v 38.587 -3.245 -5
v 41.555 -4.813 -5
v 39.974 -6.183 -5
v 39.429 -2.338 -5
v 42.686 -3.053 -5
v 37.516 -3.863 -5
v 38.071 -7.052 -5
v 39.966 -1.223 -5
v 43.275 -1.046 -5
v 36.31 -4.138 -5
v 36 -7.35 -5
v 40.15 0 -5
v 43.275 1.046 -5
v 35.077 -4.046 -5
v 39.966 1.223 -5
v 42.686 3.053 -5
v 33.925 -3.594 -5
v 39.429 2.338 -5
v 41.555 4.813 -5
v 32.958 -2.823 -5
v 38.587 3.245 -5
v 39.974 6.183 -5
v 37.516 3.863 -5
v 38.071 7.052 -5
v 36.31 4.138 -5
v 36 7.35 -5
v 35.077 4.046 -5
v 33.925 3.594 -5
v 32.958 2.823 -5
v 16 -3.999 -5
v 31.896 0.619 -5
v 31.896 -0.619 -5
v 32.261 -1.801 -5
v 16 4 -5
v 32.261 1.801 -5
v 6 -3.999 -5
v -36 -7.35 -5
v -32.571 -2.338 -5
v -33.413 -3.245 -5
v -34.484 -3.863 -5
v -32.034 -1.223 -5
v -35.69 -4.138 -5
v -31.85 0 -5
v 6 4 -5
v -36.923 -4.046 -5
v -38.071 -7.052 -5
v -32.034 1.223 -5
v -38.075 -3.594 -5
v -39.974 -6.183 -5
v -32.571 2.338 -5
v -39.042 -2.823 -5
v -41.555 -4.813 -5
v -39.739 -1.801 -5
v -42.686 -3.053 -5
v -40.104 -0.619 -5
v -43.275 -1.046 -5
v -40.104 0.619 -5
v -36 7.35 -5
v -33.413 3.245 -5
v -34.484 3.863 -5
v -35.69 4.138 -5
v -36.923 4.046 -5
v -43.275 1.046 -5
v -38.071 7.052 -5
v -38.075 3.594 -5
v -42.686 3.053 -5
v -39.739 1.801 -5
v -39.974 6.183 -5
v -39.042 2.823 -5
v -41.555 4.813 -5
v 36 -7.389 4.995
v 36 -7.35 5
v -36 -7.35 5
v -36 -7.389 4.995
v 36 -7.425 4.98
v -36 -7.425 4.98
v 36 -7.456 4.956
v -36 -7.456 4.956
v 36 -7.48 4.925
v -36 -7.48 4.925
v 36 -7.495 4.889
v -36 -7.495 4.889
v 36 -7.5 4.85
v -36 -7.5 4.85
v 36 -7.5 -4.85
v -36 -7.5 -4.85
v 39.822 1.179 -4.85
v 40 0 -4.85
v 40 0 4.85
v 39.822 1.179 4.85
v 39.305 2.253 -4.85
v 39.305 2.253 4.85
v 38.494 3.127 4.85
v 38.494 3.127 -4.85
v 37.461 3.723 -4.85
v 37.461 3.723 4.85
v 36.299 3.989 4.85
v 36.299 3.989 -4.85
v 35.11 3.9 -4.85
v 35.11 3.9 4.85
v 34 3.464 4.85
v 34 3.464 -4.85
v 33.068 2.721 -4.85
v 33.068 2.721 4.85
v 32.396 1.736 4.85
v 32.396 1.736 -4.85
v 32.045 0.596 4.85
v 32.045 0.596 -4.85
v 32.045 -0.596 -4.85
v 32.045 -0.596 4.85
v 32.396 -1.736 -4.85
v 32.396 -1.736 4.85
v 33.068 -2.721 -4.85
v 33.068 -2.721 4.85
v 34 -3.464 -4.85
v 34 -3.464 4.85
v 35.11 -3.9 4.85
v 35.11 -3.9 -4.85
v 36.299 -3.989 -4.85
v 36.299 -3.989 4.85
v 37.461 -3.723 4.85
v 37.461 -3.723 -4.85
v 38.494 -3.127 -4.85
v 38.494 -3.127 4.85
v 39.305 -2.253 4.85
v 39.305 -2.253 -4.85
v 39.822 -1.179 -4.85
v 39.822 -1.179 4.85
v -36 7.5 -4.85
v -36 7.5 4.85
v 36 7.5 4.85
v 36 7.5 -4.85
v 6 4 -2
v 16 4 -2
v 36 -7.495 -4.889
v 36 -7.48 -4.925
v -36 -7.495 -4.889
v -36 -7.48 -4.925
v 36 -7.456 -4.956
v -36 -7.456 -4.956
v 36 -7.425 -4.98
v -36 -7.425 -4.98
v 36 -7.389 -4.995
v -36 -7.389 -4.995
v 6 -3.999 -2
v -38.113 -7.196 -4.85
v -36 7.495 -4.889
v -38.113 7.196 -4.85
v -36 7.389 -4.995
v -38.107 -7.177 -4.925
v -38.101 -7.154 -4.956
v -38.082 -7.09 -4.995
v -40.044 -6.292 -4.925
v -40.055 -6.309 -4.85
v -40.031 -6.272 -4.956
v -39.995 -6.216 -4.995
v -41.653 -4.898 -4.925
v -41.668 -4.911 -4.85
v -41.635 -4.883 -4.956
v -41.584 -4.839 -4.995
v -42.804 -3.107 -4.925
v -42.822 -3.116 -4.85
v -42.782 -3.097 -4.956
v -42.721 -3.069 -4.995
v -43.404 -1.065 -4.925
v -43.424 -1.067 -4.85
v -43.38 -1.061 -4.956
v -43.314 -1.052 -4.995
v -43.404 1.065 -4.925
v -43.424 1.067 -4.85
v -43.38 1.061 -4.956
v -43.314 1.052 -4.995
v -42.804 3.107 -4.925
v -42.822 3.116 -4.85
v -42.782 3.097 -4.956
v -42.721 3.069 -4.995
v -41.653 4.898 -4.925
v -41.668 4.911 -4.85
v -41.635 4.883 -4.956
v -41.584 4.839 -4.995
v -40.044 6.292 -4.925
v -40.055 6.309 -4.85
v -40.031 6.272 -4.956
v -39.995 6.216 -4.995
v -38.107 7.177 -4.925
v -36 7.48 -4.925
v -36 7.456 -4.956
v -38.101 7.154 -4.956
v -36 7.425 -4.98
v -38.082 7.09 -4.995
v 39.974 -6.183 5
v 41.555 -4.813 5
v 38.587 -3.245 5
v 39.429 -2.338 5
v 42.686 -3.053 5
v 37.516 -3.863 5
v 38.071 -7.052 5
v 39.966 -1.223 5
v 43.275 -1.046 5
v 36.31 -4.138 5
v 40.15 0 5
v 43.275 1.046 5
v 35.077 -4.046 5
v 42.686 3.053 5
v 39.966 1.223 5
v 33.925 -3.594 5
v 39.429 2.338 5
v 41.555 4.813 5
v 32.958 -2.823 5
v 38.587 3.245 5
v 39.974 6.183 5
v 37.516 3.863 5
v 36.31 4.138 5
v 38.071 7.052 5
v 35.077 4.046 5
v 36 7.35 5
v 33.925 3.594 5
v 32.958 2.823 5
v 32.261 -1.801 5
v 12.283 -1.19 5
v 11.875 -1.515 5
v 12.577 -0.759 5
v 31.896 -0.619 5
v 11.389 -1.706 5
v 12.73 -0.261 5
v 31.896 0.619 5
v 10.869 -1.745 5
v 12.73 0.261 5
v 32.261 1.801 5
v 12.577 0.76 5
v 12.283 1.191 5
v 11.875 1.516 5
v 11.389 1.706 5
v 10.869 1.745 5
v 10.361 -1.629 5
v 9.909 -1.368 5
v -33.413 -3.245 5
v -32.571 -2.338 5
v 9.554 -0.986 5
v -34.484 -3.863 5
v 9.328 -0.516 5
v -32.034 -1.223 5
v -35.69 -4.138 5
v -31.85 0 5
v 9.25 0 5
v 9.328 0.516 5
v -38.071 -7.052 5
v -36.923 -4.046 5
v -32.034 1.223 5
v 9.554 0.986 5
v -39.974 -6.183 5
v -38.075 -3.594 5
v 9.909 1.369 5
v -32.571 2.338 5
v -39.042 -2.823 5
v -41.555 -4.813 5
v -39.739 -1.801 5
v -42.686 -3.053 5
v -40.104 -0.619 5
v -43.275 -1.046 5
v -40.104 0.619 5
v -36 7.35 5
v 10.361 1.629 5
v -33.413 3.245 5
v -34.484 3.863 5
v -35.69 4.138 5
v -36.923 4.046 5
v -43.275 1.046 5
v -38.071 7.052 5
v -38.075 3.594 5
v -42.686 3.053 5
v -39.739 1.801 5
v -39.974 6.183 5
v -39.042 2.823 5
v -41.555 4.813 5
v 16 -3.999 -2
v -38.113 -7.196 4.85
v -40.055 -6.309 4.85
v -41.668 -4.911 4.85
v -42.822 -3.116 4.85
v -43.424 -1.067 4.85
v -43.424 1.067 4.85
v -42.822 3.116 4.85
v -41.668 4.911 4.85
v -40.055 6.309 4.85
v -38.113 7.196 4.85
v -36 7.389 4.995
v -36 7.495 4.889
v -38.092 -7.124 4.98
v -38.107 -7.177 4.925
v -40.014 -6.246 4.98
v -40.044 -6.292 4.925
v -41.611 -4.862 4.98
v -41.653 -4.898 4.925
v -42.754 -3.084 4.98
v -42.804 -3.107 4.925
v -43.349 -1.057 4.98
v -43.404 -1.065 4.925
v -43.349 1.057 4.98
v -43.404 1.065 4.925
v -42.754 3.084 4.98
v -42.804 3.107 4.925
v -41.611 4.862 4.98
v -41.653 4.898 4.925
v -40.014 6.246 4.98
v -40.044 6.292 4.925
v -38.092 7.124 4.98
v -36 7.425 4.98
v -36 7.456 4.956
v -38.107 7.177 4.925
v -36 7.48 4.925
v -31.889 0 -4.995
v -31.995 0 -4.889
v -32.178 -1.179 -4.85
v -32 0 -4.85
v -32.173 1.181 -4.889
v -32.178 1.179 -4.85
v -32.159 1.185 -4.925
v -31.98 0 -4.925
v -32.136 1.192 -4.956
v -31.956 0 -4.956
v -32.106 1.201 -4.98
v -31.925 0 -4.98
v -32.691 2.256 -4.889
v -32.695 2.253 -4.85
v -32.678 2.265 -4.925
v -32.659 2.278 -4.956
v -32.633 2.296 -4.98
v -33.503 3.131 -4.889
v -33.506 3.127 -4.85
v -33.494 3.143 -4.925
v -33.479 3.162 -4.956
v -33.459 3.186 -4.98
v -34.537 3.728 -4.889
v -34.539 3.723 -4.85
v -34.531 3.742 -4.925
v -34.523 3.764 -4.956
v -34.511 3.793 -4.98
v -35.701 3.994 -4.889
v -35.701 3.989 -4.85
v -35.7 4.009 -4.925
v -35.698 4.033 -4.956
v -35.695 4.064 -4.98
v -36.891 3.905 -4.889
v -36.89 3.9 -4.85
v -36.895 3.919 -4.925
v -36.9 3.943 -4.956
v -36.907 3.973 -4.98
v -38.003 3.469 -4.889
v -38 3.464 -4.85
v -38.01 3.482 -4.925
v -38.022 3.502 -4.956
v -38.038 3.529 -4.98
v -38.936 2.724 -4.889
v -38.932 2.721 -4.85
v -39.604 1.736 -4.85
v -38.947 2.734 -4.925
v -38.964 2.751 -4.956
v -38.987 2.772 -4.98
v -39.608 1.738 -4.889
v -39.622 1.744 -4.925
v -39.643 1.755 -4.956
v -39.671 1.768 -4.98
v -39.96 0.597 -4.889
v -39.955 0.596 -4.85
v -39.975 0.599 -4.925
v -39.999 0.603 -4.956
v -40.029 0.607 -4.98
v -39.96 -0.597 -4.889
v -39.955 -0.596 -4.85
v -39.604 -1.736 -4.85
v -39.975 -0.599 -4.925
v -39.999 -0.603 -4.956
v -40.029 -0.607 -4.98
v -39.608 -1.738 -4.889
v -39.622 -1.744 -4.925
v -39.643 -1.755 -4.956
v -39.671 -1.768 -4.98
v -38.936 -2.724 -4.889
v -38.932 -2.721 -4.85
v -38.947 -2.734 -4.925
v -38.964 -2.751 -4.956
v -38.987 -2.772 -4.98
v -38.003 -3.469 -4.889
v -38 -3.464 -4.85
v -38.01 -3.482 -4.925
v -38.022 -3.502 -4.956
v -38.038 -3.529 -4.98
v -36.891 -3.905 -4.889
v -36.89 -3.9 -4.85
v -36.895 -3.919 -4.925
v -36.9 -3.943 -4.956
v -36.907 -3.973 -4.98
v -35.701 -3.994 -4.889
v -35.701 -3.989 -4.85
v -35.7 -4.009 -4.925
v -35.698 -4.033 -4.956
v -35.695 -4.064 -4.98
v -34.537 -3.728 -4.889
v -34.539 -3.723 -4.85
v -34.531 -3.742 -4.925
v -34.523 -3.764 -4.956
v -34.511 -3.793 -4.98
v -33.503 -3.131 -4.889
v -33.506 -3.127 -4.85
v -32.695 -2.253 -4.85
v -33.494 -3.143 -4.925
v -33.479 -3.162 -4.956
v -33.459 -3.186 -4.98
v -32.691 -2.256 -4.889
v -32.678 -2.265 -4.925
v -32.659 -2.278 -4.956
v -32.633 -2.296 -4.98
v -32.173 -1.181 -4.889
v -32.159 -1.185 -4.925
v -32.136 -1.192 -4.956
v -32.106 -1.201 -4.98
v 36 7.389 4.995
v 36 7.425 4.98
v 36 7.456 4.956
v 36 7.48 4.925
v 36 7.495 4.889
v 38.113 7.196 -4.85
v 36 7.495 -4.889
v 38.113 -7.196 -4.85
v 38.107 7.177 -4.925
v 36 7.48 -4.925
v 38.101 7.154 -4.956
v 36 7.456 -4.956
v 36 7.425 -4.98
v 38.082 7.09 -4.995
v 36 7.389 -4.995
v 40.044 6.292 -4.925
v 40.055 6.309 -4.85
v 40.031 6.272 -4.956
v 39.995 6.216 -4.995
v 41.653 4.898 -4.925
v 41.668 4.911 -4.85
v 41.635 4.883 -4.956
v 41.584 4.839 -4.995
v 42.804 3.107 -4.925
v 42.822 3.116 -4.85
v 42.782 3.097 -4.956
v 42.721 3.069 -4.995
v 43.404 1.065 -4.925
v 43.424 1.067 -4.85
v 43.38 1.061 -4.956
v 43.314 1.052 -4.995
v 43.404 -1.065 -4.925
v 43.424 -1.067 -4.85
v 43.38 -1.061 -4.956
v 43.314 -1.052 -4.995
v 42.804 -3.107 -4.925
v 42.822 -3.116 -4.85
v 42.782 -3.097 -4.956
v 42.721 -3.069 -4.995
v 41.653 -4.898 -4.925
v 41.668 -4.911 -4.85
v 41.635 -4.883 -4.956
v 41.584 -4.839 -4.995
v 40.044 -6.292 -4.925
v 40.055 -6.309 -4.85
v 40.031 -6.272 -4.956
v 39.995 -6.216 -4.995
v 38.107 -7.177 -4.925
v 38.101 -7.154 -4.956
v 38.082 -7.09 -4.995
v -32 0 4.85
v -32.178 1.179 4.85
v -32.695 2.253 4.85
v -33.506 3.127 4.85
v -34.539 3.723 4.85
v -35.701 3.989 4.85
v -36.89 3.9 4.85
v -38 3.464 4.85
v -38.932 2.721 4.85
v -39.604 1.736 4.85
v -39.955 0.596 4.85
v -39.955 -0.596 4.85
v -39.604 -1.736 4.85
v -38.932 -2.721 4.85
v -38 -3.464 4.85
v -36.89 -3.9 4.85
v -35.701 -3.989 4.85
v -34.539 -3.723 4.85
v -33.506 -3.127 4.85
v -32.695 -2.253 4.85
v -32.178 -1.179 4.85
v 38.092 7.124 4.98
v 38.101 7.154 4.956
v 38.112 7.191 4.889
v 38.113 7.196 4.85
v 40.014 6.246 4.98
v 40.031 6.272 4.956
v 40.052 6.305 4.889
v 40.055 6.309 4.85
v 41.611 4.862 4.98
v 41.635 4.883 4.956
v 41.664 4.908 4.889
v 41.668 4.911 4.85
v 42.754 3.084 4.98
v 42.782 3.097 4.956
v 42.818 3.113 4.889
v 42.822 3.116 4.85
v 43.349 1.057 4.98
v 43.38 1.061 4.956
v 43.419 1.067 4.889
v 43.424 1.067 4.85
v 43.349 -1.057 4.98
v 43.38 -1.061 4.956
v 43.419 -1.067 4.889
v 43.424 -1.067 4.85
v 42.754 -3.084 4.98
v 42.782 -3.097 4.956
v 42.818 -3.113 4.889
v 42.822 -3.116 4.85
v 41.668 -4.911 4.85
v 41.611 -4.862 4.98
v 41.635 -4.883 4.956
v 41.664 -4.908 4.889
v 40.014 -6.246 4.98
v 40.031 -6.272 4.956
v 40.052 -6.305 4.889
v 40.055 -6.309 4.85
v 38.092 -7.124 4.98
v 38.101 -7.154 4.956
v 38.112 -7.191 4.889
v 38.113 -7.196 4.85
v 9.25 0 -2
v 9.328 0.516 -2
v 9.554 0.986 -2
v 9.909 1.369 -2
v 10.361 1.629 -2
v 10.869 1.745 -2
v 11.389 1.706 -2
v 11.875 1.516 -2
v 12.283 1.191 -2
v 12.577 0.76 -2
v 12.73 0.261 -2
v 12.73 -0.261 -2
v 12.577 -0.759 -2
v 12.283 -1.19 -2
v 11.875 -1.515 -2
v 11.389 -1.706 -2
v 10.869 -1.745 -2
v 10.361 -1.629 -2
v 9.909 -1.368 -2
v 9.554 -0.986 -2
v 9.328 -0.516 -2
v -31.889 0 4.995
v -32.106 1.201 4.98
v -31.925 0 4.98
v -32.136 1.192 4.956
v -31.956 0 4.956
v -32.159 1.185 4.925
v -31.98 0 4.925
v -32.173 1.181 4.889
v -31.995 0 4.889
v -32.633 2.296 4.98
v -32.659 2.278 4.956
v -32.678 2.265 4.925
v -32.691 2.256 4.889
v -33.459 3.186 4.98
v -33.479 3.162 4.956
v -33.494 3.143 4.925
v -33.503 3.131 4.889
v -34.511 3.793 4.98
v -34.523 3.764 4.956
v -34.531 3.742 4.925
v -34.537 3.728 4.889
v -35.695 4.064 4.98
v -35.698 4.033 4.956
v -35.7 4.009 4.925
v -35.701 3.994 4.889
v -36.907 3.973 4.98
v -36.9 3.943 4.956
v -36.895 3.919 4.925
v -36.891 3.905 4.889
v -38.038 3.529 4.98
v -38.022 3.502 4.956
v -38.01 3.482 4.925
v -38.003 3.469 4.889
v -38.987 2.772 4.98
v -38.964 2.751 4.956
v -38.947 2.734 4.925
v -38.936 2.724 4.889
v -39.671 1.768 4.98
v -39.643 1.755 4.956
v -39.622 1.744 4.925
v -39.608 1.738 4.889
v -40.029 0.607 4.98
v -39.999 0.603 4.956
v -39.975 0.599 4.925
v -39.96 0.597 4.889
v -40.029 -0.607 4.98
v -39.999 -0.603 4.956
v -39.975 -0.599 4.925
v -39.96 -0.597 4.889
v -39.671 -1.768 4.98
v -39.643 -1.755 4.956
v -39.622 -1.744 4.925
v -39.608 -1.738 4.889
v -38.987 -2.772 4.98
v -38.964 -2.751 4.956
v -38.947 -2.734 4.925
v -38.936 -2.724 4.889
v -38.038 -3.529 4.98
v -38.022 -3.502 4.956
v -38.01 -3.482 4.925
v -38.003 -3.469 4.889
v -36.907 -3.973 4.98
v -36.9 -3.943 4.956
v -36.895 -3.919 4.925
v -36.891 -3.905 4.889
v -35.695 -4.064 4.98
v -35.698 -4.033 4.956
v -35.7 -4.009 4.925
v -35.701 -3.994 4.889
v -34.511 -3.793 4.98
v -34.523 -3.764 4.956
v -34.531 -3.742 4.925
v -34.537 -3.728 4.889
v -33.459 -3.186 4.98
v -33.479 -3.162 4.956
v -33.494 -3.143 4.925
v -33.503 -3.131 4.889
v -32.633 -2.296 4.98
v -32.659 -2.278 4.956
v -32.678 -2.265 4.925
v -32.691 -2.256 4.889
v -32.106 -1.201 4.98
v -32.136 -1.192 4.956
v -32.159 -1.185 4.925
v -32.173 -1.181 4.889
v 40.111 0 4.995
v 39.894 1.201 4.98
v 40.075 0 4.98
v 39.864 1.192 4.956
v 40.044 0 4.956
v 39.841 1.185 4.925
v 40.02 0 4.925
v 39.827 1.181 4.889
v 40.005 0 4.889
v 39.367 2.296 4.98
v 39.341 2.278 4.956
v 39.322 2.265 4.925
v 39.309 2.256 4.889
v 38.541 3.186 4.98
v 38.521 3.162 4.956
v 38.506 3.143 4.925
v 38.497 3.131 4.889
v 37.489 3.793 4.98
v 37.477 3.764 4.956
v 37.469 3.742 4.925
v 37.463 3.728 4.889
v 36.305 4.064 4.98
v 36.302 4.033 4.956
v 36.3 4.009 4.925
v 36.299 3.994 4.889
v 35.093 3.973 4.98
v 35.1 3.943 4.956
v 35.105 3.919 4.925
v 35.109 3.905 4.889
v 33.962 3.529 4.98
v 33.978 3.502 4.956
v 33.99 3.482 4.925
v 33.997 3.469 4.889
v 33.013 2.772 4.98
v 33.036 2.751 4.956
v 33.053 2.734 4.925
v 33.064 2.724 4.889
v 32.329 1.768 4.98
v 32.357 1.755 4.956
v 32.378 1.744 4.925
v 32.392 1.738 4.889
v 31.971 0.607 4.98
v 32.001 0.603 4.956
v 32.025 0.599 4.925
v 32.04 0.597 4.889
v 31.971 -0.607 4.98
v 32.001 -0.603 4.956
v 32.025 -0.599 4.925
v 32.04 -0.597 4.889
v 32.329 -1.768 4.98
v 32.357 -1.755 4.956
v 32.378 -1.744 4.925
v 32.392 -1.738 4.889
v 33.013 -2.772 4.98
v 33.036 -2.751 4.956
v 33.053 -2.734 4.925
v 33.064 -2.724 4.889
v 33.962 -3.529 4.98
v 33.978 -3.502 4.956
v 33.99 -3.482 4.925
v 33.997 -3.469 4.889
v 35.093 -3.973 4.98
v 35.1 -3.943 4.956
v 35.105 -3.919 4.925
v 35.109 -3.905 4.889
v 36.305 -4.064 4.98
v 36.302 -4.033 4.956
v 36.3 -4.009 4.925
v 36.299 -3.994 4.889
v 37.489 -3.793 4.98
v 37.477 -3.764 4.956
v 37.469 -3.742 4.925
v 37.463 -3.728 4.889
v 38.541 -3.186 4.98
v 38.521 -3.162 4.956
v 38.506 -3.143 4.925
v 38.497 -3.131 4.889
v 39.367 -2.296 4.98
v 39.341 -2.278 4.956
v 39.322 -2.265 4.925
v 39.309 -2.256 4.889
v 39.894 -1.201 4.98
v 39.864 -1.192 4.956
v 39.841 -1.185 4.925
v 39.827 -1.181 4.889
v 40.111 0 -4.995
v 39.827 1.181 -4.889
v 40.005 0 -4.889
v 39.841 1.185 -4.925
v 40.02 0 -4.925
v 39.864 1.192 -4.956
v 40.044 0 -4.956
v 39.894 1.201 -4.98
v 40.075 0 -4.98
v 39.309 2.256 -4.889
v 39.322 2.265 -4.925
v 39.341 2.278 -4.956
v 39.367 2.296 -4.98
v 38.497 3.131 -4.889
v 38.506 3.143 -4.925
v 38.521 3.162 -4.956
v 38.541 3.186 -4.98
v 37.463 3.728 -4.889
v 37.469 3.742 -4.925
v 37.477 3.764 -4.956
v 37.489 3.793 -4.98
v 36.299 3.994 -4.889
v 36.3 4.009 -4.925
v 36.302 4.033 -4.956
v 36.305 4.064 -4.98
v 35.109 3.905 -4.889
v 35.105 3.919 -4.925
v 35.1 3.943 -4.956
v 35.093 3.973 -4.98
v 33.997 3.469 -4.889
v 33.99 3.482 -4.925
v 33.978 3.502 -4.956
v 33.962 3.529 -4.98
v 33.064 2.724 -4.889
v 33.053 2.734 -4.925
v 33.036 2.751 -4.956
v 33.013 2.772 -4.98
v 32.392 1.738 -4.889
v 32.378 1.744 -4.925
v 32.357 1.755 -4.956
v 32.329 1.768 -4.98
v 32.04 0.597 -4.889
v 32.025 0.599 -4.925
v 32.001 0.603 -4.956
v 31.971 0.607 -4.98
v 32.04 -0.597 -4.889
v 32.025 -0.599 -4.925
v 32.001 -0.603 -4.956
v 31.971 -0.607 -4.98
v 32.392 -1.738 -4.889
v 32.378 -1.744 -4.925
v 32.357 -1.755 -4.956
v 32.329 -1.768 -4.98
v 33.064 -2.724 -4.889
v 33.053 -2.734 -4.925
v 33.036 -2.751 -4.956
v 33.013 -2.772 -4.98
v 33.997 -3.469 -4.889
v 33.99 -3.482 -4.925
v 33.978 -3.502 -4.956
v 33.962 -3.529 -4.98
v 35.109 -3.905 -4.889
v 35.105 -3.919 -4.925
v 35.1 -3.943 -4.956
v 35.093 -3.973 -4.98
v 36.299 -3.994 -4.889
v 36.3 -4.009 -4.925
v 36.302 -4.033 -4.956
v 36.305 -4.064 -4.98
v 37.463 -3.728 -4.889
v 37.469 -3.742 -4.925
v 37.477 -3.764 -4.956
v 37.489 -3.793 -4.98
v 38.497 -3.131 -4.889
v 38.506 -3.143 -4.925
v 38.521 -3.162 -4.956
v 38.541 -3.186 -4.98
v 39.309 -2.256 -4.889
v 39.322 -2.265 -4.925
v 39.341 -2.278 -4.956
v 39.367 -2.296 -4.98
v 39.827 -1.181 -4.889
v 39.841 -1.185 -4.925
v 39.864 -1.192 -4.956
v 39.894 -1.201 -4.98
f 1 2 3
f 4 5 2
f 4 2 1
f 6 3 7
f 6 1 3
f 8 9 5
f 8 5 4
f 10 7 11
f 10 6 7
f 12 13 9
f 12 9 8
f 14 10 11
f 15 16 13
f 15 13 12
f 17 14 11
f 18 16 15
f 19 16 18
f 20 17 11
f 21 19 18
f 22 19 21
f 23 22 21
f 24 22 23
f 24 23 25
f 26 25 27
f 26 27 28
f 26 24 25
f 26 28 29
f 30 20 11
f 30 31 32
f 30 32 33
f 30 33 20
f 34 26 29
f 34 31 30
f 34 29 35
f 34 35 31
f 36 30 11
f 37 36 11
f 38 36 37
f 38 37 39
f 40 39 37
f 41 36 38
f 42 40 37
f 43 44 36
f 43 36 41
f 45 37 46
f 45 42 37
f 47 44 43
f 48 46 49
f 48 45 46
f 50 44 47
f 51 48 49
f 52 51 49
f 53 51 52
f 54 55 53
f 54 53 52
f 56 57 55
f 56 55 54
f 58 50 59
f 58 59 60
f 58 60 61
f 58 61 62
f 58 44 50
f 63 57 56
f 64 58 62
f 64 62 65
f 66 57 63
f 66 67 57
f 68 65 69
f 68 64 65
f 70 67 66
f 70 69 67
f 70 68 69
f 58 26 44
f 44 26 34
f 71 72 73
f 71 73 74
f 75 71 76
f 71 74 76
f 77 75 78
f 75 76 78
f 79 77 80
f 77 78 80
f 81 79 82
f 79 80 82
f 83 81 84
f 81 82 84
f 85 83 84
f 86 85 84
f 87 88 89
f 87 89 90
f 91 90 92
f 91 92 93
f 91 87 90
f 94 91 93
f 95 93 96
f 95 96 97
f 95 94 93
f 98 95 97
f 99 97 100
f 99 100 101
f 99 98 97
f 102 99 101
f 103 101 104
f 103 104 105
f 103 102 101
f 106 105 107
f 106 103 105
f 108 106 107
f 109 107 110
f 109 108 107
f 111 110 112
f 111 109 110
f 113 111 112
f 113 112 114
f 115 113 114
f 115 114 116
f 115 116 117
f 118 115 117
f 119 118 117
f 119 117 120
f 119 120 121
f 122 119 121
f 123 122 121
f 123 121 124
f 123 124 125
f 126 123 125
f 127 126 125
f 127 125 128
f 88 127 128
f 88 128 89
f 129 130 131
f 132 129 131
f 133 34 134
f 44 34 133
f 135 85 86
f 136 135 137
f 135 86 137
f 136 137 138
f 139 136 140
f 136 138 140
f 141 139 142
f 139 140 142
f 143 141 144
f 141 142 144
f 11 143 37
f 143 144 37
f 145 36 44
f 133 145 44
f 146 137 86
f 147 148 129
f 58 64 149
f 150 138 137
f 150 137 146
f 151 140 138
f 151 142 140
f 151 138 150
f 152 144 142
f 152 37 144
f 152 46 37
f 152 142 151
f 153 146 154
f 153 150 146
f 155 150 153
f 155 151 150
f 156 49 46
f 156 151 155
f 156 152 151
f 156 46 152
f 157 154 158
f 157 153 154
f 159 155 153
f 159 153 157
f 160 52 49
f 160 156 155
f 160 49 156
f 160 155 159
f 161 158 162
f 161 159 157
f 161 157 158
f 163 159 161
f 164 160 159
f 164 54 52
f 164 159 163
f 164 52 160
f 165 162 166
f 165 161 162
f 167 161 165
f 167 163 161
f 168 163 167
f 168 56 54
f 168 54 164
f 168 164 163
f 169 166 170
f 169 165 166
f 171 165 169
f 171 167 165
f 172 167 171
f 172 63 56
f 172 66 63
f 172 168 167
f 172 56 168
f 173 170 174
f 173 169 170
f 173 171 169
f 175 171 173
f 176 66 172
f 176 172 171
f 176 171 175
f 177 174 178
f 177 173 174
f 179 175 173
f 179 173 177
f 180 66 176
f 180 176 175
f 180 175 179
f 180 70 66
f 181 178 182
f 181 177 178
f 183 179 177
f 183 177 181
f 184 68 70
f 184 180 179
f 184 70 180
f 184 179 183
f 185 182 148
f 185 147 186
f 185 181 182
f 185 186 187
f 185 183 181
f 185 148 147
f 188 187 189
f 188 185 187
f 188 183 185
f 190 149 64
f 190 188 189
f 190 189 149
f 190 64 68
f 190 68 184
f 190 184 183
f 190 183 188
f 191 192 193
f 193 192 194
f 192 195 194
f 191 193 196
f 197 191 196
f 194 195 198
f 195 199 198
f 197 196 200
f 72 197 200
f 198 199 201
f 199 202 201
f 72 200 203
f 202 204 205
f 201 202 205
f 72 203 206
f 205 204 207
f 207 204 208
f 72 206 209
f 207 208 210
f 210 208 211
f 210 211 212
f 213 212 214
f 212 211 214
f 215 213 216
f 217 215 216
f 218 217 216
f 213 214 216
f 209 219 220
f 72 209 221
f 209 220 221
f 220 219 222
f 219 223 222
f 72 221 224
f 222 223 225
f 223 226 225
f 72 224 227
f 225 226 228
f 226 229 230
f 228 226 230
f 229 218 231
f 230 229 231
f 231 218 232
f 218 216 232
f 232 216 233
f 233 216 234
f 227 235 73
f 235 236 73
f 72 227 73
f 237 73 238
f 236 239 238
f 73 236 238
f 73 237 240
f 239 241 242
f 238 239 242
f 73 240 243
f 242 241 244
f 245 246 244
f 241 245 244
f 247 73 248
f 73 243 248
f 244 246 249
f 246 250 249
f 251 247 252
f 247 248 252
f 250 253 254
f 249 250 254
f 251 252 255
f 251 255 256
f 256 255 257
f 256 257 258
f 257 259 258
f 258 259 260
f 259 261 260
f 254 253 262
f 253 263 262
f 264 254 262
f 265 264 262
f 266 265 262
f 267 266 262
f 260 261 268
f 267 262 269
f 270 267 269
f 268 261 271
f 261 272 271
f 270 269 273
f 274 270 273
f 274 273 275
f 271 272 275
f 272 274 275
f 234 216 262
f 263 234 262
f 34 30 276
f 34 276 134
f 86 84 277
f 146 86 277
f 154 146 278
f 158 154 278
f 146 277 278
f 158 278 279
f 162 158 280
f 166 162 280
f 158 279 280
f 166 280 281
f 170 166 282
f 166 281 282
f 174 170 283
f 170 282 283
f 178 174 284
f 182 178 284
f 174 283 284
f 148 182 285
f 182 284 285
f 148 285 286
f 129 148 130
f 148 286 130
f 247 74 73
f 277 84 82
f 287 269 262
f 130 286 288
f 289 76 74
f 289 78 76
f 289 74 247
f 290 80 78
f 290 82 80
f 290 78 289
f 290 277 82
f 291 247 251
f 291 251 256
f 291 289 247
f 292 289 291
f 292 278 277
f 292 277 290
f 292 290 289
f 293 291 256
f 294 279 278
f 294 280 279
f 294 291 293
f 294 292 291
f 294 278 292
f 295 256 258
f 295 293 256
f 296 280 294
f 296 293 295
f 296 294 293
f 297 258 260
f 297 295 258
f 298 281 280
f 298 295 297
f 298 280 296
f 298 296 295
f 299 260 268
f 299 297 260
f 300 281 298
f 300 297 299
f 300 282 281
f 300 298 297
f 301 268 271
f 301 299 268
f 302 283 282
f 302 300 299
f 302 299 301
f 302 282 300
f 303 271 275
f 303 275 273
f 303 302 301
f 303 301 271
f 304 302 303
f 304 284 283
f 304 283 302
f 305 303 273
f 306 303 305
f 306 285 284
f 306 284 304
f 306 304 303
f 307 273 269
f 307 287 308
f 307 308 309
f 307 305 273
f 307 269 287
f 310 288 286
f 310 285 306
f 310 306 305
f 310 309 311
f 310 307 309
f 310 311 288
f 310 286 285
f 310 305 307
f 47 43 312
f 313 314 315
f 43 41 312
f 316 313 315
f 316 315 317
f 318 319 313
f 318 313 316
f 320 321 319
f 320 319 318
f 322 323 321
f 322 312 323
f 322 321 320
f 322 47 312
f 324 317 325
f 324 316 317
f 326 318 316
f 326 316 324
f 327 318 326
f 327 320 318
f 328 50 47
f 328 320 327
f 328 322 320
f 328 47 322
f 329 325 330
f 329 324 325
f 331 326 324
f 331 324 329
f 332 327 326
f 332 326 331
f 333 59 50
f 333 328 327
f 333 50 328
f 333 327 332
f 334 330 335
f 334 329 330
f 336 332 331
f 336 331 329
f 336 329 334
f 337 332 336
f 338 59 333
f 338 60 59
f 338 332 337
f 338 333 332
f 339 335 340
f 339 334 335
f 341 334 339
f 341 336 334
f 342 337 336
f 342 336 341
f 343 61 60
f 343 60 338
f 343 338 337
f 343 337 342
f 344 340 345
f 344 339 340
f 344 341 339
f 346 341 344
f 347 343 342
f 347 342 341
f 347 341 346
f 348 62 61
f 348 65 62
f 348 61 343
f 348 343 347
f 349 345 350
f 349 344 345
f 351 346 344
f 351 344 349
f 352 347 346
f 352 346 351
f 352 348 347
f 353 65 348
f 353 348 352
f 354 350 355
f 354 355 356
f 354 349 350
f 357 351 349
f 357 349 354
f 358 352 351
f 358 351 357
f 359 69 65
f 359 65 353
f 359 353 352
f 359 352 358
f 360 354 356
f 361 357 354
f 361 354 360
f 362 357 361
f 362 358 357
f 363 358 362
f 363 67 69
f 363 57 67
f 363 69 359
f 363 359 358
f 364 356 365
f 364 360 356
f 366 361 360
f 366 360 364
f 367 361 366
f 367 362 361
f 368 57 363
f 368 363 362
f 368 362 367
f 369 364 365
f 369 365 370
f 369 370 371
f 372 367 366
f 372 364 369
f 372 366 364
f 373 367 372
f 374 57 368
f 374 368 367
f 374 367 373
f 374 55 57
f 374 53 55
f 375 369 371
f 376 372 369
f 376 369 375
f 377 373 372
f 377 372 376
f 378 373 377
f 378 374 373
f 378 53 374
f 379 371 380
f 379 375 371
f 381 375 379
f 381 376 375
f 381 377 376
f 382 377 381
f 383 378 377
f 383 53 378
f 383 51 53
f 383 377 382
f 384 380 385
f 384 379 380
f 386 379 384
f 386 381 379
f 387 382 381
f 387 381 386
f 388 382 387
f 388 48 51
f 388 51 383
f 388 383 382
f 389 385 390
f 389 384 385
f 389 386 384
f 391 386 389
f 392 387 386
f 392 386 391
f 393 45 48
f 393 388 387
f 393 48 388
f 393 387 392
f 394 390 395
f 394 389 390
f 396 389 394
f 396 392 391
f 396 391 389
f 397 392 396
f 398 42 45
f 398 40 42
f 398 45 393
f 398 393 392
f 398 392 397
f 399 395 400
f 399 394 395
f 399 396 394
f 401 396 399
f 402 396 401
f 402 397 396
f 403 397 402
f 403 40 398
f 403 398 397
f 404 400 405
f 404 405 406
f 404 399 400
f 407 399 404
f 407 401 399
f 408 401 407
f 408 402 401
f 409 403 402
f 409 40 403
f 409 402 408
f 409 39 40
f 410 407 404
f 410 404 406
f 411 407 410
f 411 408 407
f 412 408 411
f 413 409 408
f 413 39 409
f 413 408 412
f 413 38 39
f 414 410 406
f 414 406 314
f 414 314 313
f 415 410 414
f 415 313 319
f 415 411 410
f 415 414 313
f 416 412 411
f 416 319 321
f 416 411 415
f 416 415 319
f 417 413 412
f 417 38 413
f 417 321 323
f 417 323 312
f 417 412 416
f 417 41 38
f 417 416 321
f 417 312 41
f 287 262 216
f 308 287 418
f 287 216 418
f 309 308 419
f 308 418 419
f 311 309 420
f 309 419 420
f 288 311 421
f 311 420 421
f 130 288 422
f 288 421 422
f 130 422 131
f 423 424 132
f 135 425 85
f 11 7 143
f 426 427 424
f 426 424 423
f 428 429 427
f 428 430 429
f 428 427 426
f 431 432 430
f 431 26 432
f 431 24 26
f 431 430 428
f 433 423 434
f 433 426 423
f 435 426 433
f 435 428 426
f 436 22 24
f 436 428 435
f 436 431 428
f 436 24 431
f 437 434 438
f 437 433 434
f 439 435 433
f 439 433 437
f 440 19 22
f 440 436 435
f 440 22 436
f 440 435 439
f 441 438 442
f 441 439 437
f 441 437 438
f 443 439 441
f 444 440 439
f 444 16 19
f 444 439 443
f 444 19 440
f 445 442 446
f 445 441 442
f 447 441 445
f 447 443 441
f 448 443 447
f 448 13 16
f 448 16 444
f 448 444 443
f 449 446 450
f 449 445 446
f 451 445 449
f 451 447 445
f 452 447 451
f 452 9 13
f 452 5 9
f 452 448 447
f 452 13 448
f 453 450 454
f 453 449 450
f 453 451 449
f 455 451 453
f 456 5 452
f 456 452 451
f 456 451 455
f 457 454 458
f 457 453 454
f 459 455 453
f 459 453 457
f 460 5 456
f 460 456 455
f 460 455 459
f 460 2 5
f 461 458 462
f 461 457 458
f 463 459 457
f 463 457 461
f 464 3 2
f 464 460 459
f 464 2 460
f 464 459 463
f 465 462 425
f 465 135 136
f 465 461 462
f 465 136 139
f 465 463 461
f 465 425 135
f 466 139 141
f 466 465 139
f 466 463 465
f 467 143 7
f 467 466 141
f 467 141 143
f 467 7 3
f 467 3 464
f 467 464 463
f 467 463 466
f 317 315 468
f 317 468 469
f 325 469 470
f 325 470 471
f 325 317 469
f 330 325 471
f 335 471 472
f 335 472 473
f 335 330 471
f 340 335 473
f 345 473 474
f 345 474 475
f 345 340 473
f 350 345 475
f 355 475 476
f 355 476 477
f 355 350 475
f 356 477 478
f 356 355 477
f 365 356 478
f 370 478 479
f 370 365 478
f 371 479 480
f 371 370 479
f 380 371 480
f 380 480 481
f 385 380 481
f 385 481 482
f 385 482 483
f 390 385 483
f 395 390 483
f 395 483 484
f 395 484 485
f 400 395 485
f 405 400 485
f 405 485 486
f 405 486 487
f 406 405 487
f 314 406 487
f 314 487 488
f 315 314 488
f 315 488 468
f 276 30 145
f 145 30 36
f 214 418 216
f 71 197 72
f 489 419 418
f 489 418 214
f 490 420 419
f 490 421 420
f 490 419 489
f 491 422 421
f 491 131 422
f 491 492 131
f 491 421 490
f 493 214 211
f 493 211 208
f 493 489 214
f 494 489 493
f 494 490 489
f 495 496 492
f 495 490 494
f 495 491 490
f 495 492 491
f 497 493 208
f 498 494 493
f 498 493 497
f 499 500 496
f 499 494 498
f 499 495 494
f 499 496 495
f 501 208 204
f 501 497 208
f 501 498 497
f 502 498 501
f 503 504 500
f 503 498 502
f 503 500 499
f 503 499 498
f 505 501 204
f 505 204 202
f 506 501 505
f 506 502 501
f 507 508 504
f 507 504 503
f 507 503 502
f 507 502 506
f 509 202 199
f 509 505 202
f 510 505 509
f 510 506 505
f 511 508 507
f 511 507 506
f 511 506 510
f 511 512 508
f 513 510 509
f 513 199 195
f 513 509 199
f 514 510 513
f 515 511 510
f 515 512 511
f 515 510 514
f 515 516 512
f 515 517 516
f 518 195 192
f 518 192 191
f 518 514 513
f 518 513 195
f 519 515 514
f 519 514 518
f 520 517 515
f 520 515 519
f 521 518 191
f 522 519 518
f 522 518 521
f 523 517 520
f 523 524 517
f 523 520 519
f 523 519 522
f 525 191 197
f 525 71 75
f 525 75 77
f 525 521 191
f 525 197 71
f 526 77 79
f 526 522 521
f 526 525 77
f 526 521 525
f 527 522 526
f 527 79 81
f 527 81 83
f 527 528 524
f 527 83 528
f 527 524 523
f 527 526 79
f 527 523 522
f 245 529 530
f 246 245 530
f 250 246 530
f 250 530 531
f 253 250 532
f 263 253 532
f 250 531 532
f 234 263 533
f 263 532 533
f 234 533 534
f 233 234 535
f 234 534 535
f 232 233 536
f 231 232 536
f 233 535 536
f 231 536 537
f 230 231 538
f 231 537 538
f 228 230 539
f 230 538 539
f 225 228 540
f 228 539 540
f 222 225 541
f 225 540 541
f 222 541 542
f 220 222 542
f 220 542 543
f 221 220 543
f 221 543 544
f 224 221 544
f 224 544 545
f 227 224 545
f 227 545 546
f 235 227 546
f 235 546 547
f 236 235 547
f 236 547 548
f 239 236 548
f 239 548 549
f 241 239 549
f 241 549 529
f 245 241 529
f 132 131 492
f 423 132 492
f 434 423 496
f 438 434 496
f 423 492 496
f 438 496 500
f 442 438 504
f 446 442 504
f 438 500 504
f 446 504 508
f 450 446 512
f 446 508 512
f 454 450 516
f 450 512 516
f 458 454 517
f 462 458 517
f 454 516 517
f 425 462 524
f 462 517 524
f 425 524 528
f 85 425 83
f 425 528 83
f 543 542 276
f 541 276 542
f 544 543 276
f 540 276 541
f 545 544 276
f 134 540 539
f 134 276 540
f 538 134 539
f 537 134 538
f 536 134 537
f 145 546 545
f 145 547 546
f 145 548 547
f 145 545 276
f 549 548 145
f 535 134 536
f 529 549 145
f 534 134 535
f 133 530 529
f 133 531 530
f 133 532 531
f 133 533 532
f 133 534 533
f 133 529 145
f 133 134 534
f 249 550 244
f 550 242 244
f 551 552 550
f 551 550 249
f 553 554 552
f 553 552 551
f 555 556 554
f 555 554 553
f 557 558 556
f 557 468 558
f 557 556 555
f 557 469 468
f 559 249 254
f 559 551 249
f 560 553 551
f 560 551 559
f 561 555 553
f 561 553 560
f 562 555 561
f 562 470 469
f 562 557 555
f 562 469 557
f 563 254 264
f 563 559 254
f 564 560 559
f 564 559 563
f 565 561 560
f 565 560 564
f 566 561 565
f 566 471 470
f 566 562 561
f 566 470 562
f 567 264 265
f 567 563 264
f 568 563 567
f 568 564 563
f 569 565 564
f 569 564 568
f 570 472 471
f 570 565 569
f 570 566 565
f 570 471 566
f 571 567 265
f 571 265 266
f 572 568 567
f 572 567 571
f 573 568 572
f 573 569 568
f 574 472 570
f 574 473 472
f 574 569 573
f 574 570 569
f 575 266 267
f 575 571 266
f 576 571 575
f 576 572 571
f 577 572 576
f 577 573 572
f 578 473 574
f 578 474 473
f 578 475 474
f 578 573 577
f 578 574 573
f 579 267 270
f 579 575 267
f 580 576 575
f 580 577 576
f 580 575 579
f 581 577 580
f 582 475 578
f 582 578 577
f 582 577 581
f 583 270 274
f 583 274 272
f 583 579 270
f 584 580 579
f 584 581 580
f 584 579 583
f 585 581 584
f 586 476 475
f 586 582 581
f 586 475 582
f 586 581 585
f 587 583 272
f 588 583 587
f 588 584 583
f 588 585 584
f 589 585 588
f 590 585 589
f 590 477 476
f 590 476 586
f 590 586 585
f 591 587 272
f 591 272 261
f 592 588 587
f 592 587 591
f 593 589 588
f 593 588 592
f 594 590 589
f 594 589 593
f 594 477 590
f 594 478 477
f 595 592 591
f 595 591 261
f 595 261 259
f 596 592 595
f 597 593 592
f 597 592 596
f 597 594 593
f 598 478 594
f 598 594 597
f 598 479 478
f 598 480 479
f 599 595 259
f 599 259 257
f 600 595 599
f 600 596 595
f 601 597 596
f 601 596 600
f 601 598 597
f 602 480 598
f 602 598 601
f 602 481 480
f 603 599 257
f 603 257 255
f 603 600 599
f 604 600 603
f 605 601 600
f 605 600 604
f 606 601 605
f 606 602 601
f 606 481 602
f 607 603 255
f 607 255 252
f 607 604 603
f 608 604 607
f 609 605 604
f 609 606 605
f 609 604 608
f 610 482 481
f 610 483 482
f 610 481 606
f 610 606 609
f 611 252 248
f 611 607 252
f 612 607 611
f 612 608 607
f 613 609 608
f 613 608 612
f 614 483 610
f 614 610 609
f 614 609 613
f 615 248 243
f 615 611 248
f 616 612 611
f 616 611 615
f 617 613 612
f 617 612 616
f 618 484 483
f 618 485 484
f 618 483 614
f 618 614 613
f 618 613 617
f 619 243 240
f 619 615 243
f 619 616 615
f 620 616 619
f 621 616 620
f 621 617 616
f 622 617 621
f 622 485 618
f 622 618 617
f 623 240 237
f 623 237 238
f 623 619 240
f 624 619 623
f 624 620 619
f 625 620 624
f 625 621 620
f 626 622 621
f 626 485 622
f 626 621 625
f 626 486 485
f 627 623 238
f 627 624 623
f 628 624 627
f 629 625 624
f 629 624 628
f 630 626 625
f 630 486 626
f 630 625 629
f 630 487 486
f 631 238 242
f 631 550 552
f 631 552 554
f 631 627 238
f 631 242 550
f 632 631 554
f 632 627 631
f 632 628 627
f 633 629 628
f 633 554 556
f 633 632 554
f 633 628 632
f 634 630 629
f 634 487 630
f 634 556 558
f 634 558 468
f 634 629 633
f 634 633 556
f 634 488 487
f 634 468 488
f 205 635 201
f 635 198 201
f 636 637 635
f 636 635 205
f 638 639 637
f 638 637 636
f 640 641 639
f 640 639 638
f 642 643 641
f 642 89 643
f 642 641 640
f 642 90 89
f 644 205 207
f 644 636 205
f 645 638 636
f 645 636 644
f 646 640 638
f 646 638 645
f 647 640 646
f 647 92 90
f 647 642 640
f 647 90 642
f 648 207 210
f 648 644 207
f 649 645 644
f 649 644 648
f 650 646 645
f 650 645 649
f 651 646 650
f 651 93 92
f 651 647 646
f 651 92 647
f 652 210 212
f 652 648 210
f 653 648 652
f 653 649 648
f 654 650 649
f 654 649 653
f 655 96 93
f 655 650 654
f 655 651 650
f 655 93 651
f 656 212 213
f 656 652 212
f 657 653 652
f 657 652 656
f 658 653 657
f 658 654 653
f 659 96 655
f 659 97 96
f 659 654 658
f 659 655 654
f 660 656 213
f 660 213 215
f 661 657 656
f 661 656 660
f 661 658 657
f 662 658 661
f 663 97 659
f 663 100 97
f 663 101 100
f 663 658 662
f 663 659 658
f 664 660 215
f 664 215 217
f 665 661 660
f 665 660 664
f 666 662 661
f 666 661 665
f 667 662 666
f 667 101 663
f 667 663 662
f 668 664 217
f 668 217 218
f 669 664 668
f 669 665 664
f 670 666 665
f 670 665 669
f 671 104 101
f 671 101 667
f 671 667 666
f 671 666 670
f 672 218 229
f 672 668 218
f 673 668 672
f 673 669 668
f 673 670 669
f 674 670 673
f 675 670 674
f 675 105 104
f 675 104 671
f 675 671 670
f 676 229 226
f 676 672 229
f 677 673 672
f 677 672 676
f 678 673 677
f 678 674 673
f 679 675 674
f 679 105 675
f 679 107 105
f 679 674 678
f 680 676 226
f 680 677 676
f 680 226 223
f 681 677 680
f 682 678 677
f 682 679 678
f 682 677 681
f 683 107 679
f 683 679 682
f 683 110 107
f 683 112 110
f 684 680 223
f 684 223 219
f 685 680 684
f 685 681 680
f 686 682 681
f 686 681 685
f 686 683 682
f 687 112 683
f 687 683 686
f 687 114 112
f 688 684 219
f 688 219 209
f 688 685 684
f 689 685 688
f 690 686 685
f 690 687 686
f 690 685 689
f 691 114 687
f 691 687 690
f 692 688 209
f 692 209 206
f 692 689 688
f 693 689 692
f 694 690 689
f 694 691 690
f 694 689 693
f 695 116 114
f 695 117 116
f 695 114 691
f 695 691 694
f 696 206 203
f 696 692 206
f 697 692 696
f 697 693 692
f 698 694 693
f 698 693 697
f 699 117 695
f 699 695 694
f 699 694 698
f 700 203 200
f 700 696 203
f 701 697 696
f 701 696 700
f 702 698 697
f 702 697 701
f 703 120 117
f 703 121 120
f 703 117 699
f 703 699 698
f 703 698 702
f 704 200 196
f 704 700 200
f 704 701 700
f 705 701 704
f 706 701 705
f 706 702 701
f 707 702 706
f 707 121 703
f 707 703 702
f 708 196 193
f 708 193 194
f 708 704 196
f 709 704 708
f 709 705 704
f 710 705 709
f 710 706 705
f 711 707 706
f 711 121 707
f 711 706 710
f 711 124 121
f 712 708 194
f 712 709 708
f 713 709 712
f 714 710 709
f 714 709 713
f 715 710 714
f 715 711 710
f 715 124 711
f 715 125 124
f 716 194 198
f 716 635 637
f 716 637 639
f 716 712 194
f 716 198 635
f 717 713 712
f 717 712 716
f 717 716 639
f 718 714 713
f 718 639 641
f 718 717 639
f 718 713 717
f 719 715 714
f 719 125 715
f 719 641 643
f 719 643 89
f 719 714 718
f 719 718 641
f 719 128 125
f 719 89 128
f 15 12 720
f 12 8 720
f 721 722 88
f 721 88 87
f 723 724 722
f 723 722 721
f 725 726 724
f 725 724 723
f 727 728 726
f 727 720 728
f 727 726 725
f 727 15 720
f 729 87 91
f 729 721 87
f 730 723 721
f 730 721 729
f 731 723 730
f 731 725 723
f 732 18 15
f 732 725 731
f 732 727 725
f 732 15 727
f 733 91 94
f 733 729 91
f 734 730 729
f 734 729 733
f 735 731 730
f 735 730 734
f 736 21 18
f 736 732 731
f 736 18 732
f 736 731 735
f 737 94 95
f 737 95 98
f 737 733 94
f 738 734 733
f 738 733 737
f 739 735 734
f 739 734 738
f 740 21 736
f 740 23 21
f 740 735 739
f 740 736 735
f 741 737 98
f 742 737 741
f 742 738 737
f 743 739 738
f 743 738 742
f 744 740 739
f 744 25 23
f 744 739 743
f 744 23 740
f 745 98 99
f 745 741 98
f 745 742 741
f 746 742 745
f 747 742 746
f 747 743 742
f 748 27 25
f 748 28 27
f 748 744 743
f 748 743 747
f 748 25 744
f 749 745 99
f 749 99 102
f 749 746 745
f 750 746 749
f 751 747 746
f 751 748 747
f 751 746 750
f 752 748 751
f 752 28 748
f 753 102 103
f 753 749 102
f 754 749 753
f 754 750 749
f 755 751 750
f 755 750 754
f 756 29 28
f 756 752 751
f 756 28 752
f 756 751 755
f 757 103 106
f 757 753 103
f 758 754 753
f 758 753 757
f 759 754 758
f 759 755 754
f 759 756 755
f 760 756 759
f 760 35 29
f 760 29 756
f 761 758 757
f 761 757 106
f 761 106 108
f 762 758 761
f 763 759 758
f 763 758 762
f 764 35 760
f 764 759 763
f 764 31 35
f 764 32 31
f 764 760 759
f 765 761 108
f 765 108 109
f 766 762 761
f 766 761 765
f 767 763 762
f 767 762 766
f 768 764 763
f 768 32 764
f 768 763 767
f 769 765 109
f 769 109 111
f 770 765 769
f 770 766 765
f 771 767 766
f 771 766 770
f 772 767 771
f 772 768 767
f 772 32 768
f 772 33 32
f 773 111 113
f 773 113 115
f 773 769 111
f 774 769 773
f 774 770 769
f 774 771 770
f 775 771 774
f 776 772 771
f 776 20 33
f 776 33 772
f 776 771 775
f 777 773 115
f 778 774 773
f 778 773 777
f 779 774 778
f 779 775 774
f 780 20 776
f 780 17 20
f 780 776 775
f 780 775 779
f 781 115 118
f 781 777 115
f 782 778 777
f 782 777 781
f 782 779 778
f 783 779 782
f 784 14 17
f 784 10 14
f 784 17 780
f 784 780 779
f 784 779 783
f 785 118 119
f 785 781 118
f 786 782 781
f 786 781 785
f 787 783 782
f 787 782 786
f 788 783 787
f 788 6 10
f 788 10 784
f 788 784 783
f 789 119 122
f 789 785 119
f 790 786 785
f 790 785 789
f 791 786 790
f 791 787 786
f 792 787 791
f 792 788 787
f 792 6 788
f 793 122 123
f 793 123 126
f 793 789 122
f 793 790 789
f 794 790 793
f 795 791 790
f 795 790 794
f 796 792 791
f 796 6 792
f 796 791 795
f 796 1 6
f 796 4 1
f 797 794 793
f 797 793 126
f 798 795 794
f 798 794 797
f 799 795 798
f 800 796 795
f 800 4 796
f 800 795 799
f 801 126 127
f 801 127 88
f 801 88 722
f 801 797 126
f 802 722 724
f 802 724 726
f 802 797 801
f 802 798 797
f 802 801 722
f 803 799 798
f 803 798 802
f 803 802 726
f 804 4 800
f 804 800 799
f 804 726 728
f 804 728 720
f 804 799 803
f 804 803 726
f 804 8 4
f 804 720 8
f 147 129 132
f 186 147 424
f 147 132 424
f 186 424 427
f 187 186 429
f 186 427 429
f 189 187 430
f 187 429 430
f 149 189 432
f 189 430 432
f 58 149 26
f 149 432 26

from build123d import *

# Parameters (mm, degrees)
SKETCH1_R           = 4
BOSS_EXTRUDE1_DEPTH = 5
FILLET2_R           = 0.15
SKETCH2_W           = 10
SKETCH2_H           = 7.9994
CUT_EXTRUDE1_DEPTH  = 3
SKETCH3_R           = 1.75
CUT_EXTRUDE2_DEPTH  = 45.69339996


with BuildPart() as part:
    # Sketch1 → Boss-Extrude1 (new, symmetric)
    with BuildSketch(Plane.XY):
        with BuildLine():
            Line((-35.999998845, 7.5), (35.999998845, 7.5))
            ThreePointArc((35.999998845, 7.5), (43.5, 0), (35.999998845, -7.5))
            Line((35.999998845, -7.5), (-35.999998845, -7.5))
            ThreePointArc((-35.999998845, -7.5), (-43.5, 0), (-35.999998845, 7.5))
        make_face()
        with Locations((-36, 0)):
            Circle(SKETCH1_R, mode=Mode.SUBTRACT)
        with Locations((36, 0)):
            Circle(SKETCH1_R, mode=Mode.SUBTRACT)
    extrude(amount=BOSS_EXTRUDE1_DEPTH, both=True)

    # Fillet2
    fillet2_edges = [part.edges().sort_by_distance(p)[0] for p in [
        (-40, 0, -5),
        (-40, 0, 5),
        (-43.5, 0, 5),
        (32, 0, -5),
        (32, 0, 5),
        (0, -7.5, 5),
        (43.5, 0, 5),
        (0, -7.5, -5),
        (-43.5, 0, -5),
        (0, 7.5, -5),
        (43.5, 0, -5),
        (0, 7.5, 5),
    ]]
    fillet(fillet2_edges, radius=FILLET2_R)

    # Sketch2 → Cut-Extrude1 (cut)
    with BuildSketch(Plane(origin=(0, 0, -5), x_dir=(-1, 0, 0), z_dir=(0, 0, -1))):
        with Locations((-11, 0.0003)):
            Rectangle(SKETCH2_W, SKETCH2_H)
    extrude(amount=-CUT_EXTRUDE1_DEPTH, mode=Mode.SUBTRACT)

    # Sketch3 → Cut-Extrude2 (cut, through all)
    with BuildSketch(Plane(origin=(0, 0, -2), x_dir=(-1, 0, 0), z_dir=(0, 0, -1))):
        with Locations((-11, 0.0003)):
            Circle(SKETCH3_R)
    extrude(amount=-CUT_EXTRUDE2_DEPTH, mode=Mode.SUBTRACT)


solid = part.part
